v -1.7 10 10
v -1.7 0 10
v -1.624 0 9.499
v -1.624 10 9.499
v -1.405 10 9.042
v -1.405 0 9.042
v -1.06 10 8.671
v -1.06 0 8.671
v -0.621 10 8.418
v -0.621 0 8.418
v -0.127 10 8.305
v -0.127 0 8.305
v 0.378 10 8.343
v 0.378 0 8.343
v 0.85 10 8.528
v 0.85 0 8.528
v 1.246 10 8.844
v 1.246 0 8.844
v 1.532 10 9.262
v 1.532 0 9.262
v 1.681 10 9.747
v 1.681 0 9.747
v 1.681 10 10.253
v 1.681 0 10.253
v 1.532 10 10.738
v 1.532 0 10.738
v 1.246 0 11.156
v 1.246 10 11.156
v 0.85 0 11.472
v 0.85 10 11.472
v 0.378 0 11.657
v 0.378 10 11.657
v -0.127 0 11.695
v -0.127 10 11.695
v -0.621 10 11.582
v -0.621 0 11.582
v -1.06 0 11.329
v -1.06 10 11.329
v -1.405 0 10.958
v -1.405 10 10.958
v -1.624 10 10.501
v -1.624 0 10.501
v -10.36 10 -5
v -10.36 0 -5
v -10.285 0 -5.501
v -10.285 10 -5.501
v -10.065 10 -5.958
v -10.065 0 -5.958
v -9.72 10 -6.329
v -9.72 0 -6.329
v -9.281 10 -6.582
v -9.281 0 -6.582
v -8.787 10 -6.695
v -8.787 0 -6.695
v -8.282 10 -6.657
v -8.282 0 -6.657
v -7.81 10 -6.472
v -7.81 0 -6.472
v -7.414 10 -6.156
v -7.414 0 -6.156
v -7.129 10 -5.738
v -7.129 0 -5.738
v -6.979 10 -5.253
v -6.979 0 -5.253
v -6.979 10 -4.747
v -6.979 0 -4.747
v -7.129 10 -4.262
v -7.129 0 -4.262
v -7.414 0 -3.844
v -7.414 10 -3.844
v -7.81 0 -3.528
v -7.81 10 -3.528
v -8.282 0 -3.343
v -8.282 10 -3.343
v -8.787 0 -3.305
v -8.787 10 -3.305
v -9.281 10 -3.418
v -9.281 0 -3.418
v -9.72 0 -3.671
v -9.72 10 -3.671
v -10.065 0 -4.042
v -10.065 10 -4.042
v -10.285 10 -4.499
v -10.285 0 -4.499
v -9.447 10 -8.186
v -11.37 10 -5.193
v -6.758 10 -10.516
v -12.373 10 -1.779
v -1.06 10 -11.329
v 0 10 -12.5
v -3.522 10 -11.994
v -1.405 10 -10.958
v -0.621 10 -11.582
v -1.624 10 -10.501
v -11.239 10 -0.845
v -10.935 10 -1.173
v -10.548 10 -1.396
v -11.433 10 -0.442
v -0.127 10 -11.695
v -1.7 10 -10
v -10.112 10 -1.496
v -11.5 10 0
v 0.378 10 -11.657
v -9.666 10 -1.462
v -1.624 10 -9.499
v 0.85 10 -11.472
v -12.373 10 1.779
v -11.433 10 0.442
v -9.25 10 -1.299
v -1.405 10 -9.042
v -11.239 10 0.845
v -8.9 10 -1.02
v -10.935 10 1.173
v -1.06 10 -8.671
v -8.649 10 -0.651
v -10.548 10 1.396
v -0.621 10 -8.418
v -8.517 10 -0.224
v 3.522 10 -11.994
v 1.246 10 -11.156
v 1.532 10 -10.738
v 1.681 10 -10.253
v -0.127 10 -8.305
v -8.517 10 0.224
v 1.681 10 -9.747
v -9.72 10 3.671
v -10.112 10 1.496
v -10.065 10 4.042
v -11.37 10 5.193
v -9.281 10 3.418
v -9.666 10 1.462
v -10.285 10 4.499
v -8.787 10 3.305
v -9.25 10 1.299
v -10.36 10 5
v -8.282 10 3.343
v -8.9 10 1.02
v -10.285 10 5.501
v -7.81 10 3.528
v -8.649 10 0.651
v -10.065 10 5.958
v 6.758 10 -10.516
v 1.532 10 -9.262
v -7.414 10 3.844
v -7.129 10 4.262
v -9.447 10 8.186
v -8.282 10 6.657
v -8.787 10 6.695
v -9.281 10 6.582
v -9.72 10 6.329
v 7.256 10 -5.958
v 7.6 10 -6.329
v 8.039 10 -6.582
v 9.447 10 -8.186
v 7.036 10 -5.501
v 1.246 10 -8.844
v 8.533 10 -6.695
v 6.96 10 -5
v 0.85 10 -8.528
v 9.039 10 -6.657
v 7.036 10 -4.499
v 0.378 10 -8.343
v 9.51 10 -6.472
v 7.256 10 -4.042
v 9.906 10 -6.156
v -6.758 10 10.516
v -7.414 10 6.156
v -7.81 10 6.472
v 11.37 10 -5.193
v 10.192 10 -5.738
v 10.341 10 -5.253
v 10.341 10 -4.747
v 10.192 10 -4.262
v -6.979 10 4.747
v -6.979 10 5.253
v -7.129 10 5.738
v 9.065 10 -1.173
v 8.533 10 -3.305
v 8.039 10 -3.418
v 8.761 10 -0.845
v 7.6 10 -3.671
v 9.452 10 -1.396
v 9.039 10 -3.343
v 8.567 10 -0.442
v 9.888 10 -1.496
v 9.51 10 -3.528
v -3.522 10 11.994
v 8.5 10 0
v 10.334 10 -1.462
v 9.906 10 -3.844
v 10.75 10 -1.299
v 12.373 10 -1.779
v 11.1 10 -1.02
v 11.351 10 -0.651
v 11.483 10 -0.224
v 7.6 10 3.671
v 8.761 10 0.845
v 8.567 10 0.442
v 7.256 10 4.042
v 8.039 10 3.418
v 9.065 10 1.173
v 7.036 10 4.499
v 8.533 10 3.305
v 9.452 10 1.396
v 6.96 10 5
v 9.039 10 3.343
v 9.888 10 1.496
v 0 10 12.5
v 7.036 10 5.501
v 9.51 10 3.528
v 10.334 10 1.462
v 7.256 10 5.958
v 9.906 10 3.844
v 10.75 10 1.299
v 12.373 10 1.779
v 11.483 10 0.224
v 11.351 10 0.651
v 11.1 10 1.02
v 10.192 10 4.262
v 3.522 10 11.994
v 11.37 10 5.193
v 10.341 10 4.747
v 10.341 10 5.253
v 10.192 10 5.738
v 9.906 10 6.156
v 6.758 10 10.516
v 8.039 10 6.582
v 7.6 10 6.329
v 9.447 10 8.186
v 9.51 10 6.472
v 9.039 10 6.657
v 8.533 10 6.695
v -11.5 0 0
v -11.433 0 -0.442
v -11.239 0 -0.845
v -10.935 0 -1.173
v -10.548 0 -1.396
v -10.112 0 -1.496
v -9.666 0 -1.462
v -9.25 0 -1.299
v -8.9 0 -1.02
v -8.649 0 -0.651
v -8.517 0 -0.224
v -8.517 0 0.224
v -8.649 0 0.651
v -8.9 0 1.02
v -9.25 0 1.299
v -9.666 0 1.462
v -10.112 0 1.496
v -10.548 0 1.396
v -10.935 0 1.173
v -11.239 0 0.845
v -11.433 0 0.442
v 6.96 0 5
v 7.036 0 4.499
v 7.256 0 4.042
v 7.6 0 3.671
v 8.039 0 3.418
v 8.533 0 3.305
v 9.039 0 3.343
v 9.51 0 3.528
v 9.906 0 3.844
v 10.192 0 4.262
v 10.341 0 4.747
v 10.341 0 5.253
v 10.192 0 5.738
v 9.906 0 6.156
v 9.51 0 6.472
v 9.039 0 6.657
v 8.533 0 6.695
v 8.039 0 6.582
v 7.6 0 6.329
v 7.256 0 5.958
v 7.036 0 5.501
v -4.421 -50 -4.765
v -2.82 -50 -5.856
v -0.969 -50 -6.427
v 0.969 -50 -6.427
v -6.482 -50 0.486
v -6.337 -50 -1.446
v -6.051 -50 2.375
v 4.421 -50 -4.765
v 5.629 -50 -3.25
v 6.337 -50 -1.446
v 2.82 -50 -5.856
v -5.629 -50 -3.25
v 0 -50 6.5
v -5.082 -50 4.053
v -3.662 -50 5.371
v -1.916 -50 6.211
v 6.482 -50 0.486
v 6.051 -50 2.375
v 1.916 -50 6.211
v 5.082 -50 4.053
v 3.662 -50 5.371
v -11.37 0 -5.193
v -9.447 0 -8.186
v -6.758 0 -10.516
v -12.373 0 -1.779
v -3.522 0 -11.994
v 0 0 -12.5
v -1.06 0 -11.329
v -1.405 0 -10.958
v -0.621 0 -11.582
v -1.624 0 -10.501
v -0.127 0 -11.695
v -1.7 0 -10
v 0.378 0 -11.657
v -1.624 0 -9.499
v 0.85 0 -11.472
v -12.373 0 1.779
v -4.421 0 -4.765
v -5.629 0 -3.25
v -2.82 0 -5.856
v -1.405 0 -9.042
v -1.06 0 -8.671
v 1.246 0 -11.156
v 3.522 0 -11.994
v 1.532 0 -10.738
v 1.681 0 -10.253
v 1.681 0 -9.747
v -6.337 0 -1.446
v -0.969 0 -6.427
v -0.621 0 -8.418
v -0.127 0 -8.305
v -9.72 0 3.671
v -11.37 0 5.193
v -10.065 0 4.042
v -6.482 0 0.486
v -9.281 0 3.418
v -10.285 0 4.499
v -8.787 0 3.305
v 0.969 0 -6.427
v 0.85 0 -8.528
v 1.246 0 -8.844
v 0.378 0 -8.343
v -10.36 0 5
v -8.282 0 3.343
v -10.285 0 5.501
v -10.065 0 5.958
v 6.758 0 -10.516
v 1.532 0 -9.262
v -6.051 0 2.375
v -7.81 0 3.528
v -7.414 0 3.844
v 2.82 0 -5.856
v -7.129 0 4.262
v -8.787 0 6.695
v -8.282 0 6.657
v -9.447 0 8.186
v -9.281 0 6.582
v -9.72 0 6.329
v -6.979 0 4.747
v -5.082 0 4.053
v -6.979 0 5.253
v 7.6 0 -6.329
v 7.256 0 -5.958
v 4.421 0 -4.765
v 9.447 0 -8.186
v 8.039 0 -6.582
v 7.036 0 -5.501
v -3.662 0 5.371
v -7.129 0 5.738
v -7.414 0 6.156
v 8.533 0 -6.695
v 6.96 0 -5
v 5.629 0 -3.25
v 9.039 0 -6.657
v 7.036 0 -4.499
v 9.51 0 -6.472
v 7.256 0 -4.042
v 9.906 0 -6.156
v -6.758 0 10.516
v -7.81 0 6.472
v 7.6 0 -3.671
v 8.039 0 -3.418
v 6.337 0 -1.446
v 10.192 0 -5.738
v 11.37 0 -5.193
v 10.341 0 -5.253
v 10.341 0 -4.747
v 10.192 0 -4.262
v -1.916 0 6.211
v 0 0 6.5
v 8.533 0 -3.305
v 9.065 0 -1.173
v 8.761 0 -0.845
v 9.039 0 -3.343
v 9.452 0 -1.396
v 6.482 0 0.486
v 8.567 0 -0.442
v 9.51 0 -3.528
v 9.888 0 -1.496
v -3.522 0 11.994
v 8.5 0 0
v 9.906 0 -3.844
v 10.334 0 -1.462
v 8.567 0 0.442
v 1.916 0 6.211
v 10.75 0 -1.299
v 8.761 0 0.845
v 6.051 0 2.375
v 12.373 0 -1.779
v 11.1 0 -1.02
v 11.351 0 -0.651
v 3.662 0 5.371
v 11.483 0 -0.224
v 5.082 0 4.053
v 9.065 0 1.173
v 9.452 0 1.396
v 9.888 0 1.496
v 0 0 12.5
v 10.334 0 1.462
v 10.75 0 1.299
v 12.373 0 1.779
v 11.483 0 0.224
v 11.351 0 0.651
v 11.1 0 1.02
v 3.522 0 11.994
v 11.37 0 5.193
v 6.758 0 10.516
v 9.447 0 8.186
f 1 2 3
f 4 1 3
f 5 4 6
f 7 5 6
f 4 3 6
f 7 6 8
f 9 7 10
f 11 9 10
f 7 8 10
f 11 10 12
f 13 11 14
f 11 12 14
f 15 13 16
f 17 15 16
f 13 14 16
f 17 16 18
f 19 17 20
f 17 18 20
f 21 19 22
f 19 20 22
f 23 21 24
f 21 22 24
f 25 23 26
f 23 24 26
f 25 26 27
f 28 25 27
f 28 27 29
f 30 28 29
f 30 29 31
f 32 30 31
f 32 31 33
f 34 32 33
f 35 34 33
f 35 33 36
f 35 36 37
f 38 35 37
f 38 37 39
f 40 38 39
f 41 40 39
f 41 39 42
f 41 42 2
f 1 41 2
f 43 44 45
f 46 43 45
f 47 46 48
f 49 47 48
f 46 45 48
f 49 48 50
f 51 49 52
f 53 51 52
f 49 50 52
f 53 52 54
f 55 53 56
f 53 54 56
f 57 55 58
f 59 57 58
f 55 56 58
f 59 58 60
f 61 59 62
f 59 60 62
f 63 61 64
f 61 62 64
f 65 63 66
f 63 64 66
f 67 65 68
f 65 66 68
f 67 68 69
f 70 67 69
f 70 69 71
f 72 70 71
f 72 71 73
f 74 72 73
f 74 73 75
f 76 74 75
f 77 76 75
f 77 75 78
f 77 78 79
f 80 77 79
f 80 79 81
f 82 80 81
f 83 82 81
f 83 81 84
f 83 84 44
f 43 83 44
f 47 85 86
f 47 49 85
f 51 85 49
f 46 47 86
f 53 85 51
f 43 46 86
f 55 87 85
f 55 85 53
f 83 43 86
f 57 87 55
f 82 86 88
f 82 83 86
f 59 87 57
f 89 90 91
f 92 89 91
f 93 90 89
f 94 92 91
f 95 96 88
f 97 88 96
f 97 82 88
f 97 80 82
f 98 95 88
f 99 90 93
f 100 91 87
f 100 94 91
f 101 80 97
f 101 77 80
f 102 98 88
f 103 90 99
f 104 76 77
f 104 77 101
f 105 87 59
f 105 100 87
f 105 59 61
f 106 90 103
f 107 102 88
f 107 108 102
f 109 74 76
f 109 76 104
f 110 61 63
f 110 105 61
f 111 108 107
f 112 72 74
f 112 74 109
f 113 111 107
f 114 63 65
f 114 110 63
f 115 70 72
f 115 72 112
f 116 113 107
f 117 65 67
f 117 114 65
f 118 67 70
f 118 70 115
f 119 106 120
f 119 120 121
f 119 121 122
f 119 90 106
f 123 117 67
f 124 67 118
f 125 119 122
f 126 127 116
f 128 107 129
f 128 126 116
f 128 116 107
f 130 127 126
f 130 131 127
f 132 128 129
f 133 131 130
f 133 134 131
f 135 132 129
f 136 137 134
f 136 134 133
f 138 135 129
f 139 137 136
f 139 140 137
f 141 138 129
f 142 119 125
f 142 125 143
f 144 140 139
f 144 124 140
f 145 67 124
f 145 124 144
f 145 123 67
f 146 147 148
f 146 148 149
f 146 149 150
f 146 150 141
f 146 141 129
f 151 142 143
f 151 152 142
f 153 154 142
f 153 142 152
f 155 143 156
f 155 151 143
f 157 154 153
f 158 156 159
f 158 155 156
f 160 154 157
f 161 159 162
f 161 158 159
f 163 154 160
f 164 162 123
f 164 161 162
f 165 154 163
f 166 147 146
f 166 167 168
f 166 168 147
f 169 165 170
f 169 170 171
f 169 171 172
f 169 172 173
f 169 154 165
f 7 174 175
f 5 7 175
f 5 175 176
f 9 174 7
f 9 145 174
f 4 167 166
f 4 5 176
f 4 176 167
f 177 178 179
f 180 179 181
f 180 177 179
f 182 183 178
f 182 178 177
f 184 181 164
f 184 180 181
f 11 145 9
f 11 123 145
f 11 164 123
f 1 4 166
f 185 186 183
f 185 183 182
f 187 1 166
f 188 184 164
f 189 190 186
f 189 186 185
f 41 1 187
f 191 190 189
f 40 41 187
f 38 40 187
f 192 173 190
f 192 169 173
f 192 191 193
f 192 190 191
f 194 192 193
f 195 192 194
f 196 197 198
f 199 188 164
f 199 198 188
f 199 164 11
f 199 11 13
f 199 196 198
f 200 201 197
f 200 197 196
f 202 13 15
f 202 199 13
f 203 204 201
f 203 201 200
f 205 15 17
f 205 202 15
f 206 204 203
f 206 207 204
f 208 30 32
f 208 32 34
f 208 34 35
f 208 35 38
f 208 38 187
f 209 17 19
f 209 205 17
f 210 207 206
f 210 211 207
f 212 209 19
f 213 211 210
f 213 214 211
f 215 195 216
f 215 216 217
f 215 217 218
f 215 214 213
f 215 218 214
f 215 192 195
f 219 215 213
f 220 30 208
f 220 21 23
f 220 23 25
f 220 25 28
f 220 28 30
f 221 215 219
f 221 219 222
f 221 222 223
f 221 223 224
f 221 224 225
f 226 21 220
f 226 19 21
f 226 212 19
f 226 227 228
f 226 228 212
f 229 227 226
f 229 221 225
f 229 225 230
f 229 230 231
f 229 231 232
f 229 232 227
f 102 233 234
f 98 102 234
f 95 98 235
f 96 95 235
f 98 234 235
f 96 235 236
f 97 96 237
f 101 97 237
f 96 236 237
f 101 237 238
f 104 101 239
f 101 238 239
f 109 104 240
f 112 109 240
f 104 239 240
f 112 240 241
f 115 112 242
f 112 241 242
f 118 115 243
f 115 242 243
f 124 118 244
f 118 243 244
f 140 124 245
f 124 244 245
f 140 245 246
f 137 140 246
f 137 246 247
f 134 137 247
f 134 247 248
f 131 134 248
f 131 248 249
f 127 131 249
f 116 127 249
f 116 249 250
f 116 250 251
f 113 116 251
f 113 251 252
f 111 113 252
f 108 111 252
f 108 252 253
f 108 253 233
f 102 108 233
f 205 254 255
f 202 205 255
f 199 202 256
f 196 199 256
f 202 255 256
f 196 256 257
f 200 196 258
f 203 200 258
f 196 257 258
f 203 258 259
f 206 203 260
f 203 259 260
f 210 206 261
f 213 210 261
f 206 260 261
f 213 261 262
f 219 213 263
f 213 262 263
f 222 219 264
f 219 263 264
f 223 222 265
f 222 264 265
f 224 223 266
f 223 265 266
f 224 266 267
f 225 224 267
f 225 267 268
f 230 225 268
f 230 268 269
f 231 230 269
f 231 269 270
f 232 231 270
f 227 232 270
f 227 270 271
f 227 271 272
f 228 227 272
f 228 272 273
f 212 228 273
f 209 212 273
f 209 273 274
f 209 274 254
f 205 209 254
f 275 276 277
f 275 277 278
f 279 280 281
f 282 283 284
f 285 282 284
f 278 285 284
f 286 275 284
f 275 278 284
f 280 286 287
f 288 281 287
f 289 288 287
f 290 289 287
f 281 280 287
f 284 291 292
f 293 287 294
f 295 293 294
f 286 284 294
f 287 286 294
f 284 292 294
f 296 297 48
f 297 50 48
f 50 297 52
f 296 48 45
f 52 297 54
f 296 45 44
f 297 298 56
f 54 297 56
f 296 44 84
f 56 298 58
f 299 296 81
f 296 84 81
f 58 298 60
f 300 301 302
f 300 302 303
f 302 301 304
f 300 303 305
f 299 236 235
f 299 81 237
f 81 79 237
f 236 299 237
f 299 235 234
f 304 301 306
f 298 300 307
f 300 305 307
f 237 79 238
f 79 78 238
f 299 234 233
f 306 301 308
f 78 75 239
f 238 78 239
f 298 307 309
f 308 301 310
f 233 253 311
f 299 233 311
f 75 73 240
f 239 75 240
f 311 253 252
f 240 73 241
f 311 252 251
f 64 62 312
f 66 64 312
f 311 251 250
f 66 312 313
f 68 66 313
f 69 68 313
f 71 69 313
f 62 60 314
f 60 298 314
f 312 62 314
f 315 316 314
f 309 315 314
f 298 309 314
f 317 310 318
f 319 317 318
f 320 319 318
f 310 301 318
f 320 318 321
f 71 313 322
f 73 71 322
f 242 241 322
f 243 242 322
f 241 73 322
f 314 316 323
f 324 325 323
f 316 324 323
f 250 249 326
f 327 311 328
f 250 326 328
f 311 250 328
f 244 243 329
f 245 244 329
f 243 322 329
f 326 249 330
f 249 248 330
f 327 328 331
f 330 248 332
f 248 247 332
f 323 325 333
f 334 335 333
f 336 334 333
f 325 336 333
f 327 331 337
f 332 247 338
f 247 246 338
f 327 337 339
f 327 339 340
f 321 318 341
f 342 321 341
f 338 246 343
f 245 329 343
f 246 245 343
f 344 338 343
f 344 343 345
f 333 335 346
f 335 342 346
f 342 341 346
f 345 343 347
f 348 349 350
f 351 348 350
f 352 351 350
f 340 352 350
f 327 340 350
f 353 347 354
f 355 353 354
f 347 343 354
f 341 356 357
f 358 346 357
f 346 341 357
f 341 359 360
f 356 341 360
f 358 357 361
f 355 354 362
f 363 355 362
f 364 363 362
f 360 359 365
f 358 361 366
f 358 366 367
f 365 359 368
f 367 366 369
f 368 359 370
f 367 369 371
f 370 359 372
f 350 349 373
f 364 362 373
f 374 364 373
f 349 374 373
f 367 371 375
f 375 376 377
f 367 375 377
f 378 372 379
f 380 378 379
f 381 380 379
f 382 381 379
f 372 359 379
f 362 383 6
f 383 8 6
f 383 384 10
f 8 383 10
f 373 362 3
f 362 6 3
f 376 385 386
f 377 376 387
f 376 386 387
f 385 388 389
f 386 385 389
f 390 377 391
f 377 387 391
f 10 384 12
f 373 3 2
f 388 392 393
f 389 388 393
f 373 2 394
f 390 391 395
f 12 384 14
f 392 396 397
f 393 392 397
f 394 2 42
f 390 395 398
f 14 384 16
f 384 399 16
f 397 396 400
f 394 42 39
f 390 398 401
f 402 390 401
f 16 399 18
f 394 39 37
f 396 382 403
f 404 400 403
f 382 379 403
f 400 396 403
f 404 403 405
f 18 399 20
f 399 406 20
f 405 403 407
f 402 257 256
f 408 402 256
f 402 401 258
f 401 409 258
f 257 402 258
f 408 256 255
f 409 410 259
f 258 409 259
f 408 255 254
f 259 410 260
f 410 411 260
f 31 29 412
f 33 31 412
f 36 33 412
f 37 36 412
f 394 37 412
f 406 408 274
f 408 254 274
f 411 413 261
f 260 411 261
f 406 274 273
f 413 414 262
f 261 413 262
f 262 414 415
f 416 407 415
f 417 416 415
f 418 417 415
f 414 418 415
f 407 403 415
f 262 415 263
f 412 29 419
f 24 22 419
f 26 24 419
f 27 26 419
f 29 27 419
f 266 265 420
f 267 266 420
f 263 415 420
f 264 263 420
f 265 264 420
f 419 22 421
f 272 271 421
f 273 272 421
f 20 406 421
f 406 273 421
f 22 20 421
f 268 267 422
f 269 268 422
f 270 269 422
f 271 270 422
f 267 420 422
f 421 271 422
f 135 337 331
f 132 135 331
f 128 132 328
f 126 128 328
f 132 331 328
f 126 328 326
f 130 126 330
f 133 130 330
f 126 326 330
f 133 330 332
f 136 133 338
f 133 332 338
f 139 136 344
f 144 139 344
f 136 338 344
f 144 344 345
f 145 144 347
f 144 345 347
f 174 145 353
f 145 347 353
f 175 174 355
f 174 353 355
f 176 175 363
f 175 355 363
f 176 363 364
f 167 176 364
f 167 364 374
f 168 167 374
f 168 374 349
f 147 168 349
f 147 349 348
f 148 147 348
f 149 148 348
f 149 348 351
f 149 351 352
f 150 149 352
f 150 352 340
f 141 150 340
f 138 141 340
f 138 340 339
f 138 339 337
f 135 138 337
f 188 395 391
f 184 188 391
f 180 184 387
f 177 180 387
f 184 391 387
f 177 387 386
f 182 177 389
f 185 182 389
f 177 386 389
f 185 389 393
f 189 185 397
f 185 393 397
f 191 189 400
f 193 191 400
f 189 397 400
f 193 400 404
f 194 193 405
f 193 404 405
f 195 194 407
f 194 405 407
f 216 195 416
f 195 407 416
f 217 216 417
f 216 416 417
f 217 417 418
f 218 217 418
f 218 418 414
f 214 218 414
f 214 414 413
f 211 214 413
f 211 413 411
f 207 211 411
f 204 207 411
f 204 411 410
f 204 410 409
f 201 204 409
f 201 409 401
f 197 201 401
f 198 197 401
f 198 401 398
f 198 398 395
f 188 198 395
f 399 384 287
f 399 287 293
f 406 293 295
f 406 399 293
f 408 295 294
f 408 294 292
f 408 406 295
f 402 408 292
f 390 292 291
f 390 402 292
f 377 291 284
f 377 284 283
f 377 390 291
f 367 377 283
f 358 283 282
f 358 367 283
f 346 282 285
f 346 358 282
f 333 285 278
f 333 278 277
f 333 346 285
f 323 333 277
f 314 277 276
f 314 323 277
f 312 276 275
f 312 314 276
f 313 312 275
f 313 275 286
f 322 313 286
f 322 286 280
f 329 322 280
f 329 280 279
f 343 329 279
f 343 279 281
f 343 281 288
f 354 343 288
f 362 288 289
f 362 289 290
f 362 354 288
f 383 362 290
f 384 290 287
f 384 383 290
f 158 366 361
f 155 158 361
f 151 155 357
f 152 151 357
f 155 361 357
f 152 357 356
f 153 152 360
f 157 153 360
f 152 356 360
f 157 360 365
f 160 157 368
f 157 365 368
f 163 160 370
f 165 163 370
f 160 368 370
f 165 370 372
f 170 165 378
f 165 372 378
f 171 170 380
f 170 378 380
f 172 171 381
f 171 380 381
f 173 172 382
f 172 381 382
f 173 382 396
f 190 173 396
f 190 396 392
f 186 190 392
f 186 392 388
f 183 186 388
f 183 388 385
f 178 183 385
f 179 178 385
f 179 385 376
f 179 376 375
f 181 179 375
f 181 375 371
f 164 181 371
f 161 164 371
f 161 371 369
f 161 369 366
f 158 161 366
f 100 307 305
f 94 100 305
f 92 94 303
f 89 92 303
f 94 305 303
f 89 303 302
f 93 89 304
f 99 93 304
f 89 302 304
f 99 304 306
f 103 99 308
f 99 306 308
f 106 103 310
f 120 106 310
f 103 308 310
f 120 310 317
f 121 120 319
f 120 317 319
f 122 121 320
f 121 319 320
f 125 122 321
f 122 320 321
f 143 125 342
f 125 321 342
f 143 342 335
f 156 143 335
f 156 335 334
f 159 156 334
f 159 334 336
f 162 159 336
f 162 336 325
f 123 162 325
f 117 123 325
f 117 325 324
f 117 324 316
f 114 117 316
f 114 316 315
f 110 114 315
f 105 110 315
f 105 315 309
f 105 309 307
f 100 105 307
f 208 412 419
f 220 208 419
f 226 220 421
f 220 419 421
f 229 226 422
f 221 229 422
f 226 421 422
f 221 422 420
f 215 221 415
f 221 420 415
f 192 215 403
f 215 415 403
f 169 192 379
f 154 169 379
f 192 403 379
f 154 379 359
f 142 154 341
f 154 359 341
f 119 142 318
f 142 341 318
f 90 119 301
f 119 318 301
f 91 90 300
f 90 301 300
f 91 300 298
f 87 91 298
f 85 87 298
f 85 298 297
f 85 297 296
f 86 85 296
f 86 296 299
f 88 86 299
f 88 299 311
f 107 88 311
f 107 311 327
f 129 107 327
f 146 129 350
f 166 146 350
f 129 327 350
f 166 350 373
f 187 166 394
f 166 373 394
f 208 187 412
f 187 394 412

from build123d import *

# Parameters (mm, degrees)
SKETCH1_R             = 12.5
BOSS_EXTRUDE1_DEPTH   = 10
M3_CLEARANCE_HOLE1_D  = 3.4
F_3_0MM_DOWEL_HOLE1_D = 3
SKETCH7_R             = 6.5
BOSS_EXTRUDE2_DEPTH   = 50


with BuildPart() as part:
    # Sketch1 → Boss-Extrude1 (new body)
    with BuildSketch(Plane(origin=(0, 0, 0), x_dir=(1, 0, 0), z_dir=(0, 1, 0))):
        with Locations(Location((0, 0, 0), (0, 0, 270))):
            Circle(SKETCH1_R)
    extrude(amount=BOSS_EXTRUDE1_DEPTH)

    # M3 Clearance Hole1 (through all)
    with Locations(Plane(origin=(0, 10, 0), x_dir=(1, 0, 0), z_dir=(0, 1, 0))):
        with Locations((-8.660254038, 5), (0, 10), (8.660254038, 5), (8.660254038, -5), (0, -10), (-8.660254038, -5)):
            Hole(M3_CLEARANCE_HOLE1_D / 2)

    # Ø3.0mm Dowel Hole1 (through all)
    with Locations(Plane(origin=(0, 10, 0), x_dir=(1, 0, 0), z_dir=(0, 1, 0))):
        with Locations((-10, 0), (10, 0)):
            Hole(F_3_0MM_DOWEL_HOLE1_D / 2)

    # Sketch7 → Boss-Extrude2 (add)
    with BuildSketch(Plane(origin=(0, 0, 0), x_dir=(1, 0, 0), z_dir=(0, 1, 0))):
        with Locations(Location((0, 0, 0), (0, 0, 270))):
            Circle(SKETCH7_R)
    extrude(amount=-BOSS_EXTRUDE2_DEPTH)


solid = part.part
